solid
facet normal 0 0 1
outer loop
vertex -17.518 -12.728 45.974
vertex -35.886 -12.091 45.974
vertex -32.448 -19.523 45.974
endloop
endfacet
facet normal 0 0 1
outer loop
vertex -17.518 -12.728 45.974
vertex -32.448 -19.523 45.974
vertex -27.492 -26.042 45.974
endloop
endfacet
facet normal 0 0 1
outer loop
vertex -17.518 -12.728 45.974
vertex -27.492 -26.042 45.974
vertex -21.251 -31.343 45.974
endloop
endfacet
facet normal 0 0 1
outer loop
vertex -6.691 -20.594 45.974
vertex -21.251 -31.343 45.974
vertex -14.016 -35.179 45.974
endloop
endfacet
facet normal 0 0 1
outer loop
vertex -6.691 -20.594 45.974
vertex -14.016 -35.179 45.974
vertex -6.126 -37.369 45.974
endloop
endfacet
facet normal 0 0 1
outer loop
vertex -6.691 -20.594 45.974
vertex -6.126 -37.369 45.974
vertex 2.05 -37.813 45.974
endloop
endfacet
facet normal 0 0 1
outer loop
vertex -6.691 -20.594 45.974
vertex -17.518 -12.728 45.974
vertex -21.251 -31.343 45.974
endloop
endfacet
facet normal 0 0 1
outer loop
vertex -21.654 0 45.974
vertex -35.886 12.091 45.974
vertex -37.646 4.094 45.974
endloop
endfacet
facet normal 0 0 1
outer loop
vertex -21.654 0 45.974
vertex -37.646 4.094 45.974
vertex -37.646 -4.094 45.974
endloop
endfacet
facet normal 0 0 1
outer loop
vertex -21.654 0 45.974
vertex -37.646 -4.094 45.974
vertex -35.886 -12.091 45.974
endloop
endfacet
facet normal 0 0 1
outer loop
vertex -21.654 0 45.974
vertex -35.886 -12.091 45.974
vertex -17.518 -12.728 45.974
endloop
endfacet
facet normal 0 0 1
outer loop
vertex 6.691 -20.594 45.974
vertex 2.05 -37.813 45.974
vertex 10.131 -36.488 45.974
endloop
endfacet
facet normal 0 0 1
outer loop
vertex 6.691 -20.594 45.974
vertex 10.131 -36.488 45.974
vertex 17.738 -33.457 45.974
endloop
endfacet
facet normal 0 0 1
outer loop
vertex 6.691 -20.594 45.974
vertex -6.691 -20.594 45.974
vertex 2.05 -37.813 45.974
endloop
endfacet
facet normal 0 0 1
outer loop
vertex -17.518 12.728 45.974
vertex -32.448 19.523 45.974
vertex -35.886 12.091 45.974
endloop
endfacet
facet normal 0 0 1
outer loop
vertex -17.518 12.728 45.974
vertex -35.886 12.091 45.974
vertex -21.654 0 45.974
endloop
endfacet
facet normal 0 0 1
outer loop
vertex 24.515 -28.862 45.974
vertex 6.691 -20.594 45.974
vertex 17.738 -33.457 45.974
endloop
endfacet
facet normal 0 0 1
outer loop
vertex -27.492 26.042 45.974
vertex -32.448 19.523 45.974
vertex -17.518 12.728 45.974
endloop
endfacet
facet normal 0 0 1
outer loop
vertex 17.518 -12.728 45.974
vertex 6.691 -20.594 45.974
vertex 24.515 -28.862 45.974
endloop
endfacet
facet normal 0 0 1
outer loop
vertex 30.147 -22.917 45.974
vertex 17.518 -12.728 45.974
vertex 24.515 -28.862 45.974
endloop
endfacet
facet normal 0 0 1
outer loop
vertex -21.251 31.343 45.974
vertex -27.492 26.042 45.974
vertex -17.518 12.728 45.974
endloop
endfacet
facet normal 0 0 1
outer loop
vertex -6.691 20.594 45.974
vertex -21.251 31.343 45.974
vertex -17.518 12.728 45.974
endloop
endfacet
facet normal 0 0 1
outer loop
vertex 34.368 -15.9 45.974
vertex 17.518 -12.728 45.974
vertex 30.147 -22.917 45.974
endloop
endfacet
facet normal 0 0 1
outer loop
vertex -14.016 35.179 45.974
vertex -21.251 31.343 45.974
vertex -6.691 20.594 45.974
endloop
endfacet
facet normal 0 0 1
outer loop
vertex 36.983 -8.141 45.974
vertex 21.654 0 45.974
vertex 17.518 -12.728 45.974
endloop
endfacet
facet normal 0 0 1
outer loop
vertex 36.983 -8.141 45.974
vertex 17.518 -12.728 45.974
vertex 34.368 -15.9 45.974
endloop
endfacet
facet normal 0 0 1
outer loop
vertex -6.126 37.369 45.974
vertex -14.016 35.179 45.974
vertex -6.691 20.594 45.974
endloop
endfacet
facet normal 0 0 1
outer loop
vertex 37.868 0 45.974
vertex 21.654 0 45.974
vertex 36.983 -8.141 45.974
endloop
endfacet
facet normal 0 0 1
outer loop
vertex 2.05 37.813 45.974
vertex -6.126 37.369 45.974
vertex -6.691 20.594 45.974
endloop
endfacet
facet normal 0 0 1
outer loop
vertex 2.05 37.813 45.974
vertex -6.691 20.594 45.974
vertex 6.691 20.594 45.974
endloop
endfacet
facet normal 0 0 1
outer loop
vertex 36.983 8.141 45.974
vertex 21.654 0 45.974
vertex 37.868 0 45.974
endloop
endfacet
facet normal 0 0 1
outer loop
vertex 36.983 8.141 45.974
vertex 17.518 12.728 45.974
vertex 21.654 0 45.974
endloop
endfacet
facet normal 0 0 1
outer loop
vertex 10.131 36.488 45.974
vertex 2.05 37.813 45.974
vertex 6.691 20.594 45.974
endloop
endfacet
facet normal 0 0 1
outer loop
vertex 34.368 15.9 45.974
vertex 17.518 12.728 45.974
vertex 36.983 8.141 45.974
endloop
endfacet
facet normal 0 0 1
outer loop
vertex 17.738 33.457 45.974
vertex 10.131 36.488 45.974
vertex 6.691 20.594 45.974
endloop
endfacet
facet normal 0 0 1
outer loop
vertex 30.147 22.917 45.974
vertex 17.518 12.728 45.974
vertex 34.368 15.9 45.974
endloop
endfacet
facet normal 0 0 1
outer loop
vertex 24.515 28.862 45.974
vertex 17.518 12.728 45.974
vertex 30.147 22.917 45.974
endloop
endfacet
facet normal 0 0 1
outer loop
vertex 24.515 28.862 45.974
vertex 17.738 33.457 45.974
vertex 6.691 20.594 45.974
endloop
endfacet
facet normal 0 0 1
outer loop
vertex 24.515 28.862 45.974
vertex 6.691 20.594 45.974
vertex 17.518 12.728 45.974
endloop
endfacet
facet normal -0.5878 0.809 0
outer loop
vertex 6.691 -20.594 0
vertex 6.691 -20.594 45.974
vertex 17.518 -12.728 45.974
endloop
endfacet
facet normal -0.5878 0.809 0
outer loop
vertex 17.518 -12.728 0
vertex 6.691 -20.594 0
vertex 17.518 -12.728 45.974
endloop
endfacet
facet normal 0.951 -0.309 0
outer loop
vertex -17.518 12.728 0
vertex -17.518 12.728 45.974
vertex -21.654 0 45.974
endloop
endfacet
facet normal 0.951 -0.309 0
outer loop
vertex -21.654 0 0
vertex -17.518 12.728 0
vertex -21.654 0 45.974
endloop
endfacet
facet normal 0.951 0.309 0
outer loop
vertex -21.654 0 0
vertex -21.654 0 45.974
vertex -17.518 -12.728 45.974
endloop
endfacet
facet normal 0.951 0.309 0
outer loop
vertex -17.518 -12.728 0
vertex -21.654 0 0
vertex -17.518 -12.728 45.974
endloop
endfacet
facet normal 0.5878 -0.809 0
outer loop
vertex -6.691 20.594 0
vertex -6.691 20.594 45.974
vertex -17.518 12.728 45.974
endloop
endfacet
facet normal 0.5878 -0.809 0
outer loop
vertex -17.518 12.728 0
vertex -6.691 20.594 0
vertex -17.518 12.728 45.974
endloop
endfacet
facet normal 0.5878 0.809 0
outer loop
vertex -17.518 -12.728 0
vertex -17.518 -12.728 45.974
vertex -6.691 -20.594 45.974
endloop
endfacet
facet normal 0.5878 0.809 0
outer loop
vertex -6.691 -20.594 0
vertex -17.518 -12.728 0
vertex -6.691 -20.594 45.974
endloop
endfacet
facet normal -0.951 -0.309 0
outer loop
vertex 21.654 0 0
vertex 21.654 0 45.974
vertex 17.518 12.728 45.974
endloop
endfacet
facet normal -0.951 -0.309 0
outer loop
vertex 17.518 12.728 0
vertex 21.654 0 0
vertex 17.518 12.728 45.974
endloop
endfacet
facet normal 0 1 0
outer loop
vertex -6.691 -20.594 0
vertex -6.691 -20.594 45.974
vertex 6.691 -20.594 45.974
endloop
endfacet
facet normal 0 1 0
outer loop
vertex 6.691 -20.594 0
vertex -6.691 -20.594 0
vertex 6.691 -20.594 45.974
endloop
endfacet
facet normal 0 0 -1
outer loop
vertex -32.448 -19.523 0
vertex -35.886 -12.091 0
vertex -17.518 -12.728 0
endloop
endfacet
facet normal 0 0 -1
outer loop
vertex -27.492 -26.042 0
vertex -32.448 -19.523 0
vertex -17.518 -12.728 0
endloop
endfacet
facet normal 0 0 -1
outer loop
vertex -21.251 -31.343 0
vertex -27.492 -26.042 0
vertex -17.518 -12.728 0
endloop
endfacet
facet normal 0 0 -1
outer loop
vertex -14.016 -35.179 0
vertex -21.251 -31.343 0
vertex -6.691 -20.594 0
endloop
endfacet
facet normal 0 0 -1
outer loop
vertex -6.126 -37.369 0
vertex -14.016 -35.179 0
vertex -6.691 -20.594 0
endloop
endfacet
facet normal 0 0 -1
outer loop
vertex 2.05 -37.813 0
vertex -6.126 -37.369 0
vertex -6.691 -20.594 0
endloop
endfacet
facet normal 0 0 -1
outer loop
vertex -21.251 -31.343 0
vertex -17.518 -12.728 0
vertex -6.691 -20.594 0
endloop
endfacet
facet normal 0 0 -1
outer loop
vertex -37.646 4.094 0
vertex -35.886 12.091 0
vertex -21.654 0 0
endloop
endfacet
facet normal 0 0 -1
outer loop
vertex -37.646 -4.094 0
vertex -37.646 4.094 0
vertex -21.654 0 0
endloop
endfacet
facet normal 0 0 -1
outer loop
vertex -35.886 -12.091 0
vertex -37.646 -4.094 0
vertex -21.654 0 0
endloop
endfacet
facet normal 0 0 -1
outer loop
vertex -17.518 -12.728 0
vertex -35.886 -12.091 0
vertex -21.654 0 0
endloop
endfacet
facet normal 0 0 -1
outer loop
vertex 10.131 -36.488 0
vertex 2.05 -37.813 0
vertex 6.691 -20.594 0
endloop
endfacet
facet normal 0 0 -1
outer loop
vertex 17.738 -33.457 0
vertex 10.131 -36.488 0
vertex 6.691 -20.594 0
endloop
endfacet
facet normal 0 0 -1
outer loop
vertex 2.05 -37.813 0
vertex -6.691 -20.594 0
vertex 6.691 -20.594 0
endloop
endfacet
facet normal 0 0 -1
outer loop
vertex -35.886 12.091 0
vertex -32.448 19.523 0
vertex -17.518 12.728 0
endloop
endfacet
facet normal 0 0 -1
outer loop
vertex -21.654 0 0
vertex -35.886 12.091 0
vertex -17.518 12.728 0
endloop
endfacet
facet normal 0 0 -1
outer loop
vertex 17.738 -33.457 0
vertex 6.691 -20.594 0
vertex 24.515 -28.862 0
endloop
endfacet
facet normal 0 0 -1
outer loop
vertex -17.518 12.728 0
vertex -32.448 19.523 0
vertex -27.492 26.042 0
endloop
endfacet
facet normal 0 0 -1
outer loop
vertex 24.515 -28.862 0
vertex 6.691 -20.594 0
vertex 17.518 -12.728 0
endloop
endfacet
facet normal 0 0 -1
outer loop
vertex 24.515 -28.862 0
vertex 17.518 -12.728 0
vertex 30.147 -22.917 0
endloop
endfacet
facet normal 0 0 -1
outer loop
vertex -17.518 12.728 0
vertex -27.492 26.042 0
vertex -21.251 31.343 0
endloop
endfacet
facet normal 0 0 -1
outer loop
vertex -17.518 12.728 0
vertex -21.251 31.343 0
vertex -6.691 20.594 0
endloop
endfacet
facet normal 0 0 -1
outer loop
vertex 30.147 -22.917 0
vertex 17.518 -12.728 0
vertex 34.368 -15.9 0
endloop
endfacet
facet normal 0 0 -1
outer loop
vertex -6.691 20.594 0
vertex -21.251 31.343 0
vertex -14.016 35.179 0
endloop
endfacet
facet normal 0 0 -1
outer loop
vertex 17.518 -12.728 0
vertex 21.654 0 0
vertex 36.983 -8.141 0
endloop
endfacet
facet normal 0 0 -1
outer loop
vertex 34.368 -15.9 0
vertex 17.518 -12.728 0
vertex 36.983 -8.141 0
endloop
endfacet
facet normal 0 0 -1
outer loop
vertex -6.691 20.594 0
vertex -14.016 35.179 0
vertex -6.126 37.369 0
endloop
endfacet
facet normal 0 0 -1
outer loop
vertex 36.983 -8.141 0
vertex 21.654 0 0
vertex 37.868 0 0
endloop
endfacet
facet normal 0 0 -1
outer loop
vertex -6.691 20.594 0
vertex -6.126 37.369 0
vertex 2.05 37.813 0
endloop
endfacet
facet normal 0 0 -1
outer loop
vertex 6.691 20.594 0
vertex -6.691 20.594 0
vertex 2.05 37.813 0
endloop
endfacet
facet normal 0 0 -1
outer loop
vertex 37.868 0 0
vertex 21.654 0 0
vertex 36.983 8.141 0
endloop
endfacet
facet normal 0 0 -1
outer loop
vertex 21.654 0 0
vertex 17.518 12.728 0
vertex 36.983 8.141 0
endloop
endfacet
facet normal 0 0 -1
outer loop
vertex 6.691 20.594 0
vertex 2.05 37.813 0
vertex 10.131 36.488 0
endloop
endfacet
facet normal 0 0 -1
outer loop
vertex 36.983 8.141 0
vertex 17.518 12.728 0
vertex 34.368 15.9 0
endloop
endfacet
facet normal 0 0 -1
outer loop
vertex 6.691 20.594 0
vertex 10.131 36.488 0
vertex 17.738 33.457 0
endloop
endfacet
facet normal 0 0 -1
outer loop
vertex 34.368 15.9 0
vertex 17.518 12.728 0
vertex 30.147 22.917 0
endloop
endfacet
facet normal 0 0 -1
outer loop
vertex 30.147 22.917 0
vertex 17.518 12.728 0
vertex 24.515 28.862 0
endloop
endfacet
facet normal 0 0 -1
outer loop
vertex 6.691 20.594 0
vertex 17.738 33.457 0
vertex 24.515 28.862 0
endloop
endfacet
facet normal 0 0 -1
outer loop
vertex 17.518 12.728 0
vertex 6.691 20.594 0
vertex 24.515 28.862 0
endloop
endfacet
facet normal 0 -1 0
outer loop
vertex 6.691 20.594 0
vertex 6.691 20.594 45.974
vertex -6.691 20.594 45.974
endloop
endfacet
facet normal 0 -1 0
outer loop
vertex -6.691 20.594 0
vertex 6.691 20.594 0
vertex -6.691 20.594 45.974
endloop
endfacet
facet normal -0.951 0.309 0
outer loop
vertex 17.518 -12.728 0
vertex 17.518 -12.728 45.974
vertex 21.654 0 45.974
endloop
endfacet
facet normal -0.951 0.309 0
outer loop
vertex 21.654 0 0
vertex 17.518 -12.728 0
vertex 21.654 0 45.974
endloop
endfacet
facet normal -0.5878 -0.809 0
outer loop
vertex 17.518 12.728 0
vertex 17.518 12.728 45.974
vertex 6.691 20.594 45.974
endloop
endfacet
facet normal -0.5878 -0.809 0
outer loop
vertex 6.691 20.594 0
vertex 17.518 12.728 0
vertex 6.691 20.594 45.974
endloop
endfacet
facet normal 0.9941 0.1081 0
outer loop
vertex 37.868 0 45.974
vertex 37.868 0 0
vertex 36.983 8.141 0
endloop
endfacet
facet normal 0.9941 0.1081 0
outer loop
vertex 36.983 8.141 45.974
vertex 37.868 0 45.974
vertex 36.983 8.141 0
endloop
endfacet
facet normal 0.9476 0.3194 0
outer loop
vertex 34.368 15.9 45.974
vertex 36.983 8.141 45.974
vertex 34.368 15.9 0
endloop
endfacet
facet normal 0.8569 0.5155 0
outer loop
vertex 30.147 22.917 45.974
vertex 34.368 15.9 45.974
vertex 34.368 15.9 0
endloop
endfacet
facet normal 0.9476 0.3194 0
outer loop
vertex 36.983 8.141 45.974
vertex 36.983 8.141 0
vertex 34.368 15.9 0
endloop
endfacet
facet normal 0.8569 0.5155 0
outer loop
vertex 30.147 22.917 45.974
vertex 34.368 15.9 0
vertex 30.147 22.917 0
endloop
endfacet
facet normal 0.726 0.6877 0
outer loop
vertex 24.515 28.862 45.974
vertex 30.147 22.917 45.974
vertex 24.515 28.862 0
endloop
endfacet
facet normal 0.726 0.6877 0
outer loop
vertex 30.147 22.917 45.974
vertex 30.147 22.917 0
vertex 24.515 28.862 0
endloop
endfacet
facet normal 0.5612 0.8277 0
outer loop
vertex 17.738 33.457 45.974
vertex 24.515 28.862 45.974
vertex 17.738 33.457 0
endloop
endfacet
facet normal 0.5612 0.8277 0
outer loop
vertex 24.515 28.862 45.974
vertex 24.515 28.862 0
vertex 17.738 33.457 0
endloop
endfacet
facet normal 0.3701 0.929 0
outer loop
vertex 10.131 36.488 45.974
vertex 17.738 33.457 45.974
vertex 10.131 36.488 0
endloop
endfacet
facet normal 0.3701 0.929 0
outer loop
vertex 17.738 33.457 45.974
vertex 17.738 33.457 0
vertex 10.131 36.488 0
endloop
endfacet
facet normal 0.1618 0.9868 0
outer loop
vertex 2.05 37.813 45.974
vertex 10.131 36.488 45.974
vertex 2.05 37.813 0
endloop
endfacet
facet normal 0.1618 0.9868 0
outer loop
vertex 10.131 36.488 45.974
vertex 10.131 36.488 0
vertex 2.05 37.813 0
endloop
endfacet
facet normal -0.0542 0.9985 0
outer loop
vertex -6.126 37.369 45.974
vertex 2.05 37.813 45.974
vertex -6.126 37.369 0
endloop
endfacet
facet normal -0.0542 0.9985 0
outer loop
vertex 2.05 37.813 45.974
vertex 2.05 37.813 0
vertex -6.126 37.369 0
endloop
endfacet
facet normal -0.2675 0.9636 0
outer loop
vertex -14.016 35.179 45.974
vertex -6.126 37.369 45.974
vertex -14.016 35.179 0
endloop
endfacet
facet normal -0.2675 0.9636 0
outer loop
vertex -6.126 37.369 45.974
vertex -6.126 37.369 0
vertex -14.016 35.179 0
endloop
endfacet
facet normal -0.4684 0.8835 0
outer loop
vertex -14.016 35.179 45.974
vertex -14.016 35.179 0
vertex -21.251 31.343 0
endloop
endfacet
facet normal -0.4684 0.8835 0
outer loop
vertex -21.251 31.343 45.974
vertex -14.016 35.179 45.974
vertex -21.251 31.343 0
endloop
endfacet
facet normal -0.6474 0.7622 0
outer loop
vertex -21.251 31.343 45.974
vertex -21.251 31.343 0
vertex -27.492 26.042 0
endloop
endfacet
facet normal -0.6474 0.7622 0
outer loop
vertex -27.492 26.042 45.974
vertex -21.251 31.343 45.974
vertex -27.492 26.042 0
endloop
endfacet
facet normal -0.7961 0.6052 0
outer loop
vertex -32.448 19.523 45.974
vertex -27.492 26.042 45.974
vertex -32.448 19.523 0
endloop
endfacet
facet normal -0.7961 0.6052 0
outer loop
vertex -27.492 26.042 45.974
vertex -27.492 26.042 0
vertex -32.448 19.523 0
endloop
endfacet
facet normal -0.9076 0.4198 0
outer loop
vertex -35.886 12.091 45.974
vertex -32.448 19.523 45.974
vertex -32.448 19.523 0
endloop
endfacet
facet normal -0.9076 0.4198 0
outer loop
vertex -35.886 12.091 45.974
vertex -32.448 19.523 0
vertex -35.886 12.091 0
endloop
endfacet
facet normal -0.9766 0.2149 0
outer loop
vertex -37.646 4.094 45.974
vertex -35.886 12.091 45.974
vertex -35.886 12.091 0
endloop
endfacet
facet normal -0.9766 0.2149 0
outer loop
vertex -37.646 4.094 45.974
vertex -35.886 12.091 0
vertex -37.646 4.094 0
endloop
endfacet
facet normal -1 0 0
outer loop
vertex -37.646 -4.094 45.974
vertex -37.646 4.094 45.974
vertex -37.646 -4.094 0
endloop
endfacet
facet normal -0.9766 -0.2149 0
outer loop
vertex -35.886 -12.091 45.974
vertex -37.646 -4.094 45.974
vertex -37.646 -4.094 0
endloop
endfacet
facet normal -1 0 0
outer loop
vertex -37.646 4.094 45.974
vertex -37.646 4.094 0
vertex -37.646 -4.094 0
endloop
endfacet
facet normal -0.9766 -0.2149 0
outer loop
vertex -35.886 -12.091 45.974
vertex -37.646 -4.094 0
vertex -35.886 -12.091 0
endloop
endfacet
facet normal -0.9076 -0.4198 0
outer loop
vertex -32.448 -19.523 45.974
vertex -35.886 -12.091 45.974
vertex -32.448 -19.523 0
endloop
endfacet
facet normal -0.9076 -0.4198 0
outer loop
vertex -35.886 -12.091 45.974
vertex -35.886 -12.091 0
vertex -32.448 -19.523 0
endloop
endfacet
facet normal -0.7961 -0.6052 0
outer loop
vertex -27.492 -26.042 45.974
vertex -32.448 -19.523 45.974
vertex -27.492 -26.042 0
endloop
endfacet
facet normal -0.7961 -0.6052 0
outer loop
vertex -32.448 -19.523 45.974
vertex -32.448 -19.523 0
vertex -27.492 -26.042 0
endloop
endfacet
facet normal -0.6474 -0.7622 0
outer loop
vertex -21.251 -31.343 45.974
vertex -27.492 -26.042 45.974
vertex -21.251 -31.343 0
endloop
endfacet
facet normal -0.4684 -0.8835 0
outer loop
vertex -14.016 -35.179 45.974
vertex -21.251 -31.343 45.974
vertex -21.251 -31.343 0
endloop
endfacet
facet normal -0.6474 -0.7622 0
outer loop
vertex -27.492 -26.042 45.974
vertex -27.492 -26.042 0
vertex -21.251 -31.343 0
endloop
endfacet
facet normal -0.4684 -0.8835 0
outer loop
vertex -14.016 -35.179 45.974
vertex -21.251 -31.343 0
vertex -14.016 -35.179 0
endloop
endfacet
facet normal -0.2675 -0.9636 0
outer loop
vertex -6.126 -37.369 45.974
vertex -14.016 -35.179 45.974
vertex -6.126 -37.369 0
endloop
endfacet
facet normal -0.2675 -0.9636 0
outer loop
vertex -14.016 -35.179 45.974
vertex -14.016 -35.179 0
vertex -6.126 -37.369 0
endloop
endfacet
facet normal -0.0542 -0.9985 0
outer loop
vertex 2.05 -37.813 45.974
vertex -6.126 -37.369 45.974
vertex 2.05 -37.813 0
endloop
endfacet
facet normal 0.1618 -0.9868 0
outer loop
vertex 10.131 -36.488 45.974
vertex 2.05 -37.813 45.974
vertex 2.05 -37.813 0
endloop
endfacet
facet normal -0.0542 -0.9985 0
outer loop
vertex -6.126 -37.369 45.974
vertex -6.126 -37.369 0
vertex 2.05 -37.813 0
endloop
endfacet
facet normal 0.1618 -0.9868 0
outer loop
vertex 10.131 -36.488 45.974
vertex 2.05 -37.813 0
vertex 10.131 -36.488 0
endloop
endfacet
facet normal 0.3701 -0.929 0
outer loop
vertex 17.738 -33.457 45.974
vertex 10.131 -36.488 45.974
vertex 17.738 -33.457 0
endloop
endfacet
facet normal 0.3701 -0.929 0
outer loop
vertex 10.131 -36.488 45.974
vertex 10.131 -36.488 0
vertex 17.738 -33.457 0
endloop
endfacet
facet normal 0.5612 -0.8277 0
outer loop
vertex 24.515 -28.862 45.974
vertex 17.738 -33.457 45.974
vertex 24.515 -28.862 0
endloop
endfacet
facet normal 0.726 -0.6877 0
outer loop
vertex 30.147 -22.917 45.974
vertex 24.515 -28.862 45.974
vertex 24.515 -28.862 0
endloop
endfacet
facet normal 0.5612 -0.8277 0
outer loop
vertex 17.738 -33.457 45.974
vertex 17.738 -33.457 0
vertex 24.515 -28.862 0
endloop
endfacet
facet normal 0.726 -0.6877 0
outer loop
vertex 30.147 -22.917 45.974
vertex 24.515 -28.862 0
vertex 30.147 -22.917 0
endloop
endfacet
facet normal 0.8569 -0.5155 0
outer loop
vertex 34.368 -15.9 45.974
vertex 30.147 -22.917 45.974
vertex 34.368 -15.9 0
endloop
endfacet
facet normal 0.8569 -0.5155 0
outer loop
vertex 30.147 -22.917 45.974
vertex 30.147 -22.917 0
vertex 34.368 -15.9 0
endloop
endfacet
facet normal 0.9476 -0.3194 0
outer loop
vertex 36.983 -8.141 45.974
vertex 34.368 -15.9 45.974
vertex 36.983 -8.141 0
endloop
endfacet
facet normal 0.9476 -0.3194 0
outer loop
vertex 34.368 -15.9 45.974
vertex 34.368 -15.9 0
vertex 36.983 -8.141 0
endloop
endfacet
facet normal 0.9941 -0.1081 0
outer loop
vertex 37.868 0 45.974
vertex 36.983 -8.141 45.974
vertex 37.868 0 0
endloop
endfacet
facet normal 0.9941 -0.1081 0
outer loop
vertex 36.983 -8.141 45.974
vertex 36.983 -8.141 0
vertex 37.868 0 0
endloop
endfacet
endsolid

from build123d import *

# Parameters (mm, degrees)
F0_R     = 37.868067
F1_DEPTH = 45.974
F3_DEPTH = 25.4
F4_DEPTH = 20.575


with BuildPart() as f1:
    # F0 (on Top) → F1 (new body)
    with BuildSketch(Plane.XY):
        Circle(F0_R)
    extrude(amount=F1_DEPTH)

    # F2 (on face) → F3 (cut)
    with BuildSketch(Plane.XY.offset(45.974)):
        Polygon((6.691301, 20.593707), (-6.691301, 20.593707), (-17.518053, 12.727611), (-21.653504, 0), (-17.518053, -12.727611), (-6.691301, -20.593707), (6.691301, -20.593707), (17.518053, -12.727611), (21.653504, 0), (17.518053, 12.727611), align=None)
    extrude(amount=-F3_DEPTH, mode=Mode.SUBTRACT)

    # F3_face (on face) → F4 (cut, through all)
    with BuildSketch(Plane.XY.offset(20.574)):
        Polygon((21.653504, 0), (17.518053, 12.727611), (6.691301, 20.593707), (-6.691301, 20.593707), (-17.518053, 12.727611), (-21.653504, 0), (-17.518053, -12.727611), (-6.691301, -20.593707), (6.691301, -20.593707), (17.518053, -12.727611), align=None)
    extrude(amount=-F4_DEPTH, mode=Mode.SUBTRACT)


solid = f1.part
